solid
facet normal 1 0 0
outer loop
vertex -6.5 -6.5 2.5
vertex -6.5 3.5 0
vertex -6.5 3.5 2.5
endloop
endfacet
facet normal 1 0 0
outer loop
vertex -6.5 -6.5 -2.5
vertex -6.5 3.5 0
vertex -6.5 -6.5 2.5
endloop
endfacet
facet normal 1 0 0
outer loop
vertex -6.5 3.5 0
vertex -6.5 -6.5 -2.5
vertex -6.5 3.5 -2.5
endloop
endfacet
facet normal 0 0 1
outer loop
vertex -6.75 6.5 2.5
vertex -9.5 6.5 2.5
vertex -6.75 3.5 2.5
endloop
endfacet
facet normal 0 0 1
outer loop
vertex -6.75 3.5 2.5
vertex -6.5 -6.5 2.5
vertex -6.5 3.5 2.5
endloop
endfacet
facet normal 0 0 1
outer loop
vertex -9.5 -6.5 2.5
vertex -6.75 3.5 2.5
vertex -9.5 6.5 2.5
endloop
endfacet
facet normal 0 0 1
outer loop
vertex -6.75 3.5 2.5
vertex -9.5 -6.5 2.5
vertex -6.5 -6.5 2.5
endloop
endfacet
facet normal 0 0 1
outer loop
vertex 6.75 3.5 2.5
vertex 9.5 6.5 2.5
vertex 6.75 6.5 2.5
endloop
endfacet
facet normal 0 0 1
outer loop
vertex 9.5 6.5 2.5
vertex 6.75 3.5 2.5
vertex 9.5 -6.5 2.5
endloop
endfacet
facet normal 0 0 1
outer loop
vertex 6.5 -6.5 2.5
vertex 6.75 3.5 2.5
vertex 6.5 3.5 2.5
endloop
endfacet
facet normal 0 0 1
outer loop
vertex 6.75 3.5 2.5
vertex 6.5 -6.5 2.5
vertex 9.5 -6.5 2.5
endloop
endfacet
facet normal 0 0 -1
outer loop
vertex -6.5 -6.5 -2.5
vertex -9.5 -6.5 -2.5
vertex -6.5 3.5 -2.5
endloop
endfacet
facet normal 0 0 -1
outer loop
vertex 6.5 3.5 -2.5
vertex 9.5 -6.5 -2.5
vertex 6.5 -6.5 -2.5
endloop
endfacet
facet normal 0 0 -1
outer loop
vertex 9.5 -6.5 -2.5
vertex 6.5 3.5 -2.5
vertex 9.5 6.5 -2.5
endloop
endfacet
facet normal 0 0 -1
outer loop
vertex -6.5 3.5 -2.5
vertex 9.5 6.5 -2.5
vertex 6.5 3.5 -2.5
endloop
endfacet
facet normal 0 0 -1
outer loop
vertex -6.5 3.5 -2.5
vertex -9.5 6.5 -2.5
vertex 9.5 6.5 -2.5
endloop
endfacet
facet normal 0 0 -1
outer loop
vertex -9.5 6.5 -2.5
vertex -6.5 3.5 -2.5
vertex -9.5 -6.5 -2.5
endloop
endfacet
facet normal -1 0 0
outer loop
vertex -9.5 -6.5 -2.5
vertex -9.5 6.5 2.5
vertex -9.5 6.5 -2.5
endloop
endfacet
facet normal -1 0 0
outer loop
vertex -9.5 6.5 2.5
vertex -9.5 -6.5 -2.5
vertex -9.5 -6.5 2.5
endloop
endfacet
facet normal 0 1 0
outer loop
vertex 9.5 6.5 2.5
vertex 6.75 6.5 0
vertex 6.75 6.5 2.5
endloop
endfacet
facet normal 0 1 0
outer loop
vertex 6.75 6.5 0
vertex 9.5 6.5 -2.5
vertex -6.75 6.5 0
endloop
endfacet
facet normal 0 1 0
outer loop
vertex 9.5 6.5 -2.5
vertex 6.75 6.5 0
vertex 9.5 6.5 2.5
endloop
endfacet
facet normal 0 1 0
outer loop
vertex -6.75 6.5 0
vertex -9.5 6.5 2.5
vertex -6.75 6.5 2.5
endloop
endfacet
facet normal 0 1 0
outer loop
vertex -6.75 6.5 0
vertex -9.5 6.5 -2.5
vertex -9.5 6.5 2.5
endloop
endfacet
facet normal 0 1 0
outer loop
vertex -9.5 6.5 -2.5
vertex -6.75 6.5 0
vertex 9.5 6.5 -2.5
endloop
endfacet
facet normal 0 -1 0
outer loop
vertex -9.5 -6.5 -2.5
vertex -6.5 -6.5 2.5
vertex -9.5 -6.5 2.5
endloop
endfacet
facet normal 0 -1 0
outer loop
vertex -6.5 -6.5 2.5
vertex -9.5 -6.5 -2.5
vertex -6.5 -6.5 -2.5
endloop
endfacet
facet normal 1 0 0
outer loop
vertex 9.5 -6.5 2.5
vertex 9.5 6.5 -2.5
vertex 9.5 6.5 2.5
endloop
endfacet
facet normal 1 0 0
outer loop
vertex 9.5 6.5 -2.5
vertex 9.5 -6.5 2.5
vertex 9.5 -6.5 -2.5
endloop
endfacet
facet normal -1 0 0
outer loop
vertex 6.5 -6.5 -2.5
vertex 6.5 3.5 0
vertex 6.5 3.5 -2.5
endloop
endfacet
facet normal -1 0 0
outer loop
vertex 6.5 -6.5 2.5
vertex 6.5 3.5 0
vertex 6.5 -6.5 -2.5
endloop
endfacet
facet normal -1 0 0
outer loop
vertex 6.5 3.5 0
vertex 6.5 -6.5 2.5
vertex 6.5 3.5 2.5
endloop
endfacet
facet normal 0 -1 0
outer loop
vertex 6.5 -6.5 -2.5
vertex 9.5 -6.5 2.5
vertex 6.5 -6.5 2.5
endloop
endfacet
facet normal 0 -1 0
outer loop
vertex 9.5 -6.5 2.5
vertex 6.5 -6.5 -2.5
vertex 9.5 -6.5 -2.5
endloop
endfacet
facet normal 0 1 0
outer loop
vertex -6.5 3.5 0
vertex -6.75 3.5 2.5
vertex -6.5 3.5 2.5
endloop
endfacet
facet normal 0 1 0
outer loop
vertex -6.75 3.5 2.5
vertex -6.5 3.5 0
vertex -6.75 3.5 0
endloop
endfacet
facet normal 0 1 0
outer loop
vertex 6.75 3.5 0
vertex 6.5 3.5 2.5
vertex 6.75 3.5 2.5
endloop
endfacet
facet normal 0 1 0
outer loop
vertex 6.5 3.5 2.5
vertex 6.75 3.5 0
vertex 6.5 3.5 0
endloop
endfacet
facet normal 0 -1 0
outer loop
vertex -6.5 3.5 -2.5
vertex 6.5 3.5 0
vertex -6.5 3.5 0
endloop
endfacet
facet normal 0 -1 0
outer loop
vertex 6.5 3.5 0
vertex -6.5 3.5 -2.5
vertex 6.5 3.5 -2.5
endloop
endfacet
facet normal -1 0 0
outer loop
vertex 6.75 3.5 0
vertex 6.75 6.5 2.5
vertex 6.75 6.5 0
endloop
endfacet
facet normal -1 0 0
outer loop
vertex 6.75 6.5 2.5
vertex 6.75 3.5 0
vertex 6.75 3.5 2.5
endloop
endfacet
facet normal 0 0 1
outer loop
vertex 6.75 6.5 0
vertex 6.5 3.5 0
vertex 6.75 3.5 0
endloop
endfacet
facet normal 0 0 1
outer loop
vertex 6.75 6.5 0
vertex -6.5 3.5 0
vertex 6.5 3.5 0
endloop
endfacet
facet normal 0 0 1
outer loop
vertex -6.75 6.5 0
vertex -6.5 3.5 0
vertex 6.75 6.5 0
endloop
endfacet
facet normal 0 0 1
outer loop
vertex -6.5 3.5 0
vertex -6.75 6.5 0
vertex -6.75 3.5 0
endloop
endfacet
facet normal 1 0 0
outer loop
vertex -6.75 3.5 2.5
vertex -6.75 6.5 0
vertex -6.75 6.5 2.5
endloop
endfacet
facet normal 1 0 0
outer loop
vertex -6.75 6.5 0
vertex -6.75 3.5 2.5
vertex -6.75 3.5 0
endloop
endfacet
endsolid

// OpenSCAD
a=10;
b=16;
h=5;
th=3;

difference() {
union() {
translate([-b/2,0,0])  cube([th,a+th,h],center=true);
translate([b/2,0,0])  cube([th,a+th,h],center=true);
translate([0,a/2,0])  cube([b,th,h],center=true);
}
translate([0,a/2,h/4])  cube([b-h/2,th,h/2],center=true);

}
